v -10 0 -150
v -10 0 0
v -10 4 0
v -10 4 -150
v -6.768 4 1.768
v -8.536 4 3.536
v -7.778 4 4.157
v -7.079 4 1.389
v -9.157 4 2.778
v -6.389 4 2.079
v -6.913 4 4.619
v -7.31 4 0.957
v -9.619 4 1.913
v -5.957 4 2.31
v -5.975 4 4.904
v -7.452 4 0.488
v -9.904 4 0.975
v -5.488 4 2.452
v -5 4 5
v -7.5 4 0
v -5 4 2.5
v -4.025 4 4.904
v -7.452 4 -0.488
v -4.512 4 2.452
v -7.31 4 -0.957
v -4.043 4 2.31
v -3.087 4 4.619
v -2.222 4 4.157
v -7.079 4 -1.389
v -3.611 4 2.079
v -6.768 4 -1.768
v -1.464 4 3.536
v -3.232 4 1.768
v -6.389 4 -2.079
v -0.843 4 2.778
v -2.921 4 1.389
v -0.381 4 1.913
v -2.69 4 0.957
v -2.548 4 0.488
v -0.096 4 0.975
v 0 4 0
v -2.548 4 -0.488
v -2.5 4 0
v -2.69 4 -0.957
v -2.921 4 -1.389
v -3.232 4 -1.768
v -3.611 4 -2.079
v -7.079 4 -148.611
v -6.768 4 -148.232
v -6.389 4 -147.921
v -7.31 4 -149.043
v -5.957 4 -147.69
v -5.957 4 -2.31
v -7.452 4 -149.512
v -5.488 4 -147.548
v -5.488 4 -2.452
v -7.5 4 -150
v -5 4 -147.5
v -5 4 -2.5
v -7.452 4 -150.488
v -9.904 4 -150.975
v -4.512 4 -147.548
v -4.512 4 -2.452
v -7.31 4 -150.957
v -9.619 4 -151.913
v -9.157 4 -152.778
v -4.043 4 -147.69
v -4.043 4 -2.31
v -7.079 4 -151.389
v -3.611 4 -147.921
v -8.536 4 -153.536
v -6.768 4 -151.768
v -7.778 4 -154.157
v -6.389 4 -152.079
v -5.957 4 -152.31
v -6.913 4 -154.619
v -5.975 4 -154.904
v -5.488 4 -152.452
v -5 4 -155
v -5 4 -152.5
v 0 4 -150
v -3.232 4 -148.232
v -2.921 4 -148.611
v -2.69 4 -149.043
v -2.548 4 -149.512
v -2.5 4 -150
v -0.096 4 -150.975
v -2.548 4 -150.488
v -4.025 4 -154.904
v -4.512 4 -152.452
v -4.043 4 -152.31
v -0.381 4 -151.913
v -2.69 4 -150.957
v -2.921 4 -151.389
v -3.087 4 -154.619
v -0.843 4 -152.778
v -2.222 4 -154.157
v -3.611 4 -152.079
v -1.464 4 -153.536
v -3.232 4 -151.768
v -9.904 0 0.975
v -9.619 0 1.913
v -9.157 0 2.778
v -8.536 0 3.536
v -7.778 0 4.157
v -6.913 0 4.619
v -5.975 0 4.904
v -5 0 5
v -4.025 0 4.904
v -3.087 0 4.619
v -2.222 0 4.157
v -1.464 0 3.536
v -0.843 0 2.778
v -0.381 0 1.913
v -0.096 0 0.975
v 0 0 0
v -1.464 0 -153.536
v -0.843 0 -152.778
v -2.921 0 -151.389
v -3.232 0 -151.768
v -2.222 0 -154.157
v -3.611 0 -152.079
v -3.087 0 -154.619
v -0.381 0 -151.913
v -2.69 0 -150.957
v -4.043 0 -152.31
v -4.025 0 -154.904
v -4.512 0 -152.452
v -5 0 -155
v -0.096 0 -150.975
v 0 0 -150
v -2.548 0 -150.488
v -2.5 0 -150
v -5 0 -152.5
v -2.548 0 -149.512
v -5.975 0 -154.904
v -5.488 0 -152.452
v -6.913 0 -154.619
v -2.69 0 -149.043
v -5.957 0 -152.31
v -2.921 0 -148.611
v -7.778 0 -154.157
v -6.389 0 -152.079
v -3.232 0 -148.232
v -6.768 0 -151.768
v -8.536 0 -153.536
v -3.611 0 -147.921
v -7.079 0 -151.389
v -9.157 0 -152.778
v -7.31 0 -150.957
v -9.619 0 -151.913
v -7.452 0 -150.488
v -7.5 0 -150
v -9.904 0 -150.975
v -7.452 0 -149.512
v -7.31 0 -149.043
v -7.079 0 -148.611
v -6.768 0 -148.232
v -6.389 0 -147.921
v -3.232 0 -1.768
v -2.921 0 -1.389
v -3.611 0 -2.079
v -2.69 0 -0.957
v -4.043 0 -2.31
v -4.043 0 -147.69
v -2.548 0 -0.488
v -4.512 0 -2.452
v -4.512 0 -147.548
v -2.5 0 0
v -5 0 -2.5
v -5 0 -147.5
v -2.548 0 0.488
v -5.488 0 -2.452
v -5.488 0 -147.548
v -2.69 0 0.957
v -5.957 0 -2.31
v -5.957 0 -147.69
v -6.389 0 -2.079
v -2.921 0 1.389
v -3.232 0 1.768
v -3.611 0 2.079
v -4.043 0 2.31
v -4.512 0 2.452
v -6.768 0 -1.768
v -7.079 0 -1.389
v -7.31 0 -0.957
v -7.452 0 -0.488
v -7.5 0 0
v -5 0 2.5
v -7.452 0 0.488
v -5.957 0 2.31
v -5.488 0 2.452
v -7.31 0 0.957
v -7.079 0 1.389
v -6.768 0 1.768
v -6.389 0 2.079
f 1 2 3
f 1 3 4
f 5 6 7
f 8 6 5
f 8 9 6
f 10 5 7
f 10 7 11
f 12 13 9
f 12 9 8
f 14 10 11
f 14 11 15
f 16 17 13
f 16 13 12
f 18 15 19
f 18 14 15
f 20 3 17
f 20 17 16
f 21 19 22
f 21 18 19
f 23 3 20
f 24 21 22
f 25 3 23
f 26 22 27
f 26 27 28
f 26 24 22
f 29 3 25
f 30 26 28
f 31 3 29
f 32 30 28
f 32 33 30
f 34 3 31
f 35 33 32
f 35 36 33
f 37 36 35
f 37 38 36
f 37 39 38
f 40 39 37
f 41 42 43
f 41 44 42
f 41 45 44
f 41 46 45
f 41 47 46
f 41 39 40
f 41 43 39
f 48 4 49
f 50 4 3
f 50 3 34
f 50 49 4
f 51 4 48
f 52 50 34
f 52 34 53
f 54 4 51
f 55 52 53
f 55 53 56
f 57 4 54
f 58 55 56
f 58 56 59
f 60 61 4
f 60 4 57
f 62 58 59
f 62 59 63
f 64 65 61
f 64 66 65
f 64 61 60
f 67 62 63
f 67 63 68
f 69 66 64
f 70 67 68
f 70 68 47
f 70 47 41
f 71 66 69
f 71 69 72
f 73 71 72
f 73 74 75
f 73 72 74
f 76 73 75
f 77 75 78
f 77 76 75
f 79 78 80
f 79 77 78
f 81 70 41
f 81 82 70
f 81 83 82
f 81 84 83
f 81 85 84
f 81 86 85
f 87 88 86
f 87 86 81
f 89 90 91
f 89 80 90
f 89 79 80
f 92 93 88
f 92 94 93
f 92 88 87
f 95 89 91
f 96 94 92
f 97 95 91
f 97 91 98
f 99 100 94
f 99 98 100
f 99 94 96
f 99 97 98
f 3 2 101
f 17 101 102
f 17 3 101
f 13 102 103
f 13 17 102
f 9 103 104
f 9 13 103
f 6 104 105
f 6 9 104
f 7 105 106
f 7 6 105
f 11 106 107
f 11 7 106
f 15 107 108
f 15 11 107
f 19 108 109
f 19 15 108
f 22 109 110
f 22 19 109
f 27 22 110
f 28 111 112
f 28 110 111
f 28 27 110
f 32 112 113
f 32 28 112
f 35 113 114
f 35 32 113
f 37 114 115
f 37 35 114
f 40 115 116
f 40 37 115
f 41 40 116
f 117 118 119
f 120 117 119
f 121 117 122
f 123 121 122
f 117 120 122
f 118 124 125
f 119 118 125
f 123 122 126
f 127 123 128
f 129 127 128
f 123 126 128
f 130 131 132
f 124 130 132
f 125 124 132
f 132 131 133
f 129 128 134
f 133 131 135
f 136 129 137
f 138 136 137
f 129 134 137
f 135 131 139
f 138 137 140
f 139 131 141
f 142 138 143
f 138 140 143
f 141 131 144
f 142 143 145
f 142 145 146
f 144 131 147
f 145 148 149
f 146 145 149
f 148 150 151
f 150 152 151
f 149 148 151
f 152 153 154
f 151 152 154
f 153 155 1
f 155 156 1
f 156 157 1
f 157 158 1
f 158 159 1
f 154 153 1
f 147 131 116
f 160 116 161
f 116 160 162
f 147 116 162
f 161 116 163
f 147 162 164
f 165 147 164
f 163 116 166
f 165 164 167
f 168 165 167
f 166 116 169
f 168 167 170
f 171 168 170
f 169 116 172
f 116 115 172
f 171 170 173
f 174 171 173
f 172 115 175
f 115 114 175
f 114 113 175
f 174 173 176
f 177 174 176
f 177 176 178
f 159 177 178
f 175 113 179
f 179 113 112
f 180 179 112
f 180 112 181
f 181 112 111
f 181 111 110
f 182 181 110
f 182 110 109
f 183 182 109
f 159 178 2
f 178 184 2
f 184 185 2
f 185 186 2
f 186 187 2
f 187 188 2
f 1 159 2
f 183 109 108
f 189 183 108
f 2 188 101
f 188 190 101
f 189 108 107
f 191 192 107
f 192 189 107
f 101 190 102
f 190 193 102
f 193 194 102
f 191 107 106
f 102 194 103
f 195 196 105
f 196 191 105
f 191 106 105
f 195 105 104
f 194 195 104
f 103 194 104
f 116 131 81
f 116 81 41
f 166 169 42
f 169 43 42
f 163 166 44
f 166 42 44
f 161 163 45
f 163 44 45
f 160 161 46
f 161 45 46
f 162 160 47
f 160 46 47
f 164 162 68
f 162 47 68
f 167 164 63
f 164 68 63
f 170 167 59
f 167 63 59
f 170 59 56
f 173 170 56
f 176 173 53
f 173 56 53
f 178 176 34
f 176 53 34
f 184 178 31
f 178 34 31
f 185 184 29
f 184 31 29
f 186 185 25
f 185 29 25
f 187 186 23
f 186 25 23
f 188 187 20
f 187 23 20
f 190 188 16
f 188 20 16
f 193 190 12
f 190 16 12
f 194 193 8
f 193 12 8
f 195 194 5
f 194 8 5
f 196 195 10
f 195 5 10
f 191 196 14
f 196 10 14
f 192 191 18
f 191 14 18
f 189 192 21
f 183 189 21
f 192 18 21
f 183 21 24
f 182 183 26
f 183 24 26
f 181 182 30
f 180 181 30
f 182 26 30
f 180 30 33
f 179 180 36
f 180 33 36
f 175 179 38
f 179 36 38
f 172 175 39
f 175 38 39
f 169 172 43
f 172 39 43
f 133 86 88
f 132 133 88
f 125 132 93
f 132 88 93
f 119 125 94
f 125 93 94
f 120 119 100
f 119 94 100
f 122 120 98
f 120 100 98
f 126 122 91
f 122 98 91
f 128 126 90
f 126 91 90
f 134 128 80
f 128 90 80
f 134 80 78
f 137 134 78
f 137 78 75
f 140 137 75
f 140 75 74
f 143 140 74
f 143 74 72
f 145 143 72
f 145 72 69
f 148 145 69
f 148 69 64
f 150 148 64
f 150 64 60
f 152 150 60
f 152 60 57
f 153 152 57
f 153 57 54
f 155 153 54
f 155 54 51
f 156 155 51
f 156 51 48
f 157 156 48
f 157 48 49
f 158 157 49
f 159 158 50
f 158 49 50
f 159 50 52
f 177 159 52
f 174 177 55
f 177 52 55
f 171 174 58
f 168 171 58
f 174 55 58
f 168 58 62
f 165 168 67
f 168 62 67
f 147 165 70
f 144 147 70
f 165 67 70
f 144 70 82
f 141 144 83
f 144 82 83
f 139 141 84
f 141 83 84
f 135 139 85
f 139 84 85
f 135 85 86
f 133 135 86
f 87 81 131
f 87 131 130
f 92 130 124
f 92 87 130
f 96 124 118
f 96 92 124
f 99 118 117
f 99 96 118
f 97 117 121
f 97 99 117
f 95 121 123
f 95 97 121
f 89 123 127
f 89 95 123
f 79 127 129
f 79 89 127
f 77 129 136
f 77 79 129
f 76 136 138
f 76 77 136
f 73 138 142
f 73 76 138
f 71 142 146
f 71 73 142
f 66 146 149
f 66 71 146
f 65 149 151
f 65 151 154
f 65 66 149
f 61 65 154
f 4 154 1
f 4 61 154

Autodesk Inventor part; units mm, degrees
ref_plane "YZ Plane" through (0, 0, 0) normal (1, 0, 0) x (0, 1, 0)
ref_plane "XZ Plane" through (0, 0, 0) normal (0, 1, 0) x (-1, 0, 0)
ref_plane "XY Plane" through (0, 0, 0) normal (0, 0, 1) x (1, 0, 0)
sketch "Schizzo1" plane through (0, 0, 0) normal (0, 1, 0) x (-1, 0, 0)
  line L0 (0, 0) -> (10, 0)
  line L1 (10, 0) -> (10, -150)
  line L2 (10, -150) -> (0, -150)
  line L3 (0, -150) -> (0, 0)
  dimension "d0" = 150
  dimension "d1" = 10
extrude "Estrusione1" add sketch "Schizzo1" along normal blind 4
sketch "Schizzo2" plane through (0, 4, 0) normal (0, 1, 0) x (1, 0, 0)
  line L0 (-10, 0) -> (0, 0) projected
  circle A0 centre (-5, 0) radius 5
  circle A1 centre (-5, 0) radius 2.5
  line L1 (0, 150) -> (-10, 150) projected
  circle A2 centre (-5, 150) radius 5
  circle A3 centre (-5, 150) radius 2.5
  point P0 (-7.5, 150)
  point P1 (-2.5, 150)
  point P2 (-2.5, 0)
  point P3 (-7.5, 0)
  dimension "d4" = 5
  dimension "d5" = 5
extrude "Estrusione2" add sketch "Schizzo2" against normal up to surface (4 mm away) contours A1 L0 A0 | L0 A0 A1 | A2 L1 A3 | L1 A3 A2
extrude "Estrusione3" cut sketch "Schizzo2" against normal blind 10 contours L0 A1 | A3 L1 picked at (-4.3762, 0.5526) picked at (-4.7045, 148.822)
properties part number "pod" material "Titanio"
